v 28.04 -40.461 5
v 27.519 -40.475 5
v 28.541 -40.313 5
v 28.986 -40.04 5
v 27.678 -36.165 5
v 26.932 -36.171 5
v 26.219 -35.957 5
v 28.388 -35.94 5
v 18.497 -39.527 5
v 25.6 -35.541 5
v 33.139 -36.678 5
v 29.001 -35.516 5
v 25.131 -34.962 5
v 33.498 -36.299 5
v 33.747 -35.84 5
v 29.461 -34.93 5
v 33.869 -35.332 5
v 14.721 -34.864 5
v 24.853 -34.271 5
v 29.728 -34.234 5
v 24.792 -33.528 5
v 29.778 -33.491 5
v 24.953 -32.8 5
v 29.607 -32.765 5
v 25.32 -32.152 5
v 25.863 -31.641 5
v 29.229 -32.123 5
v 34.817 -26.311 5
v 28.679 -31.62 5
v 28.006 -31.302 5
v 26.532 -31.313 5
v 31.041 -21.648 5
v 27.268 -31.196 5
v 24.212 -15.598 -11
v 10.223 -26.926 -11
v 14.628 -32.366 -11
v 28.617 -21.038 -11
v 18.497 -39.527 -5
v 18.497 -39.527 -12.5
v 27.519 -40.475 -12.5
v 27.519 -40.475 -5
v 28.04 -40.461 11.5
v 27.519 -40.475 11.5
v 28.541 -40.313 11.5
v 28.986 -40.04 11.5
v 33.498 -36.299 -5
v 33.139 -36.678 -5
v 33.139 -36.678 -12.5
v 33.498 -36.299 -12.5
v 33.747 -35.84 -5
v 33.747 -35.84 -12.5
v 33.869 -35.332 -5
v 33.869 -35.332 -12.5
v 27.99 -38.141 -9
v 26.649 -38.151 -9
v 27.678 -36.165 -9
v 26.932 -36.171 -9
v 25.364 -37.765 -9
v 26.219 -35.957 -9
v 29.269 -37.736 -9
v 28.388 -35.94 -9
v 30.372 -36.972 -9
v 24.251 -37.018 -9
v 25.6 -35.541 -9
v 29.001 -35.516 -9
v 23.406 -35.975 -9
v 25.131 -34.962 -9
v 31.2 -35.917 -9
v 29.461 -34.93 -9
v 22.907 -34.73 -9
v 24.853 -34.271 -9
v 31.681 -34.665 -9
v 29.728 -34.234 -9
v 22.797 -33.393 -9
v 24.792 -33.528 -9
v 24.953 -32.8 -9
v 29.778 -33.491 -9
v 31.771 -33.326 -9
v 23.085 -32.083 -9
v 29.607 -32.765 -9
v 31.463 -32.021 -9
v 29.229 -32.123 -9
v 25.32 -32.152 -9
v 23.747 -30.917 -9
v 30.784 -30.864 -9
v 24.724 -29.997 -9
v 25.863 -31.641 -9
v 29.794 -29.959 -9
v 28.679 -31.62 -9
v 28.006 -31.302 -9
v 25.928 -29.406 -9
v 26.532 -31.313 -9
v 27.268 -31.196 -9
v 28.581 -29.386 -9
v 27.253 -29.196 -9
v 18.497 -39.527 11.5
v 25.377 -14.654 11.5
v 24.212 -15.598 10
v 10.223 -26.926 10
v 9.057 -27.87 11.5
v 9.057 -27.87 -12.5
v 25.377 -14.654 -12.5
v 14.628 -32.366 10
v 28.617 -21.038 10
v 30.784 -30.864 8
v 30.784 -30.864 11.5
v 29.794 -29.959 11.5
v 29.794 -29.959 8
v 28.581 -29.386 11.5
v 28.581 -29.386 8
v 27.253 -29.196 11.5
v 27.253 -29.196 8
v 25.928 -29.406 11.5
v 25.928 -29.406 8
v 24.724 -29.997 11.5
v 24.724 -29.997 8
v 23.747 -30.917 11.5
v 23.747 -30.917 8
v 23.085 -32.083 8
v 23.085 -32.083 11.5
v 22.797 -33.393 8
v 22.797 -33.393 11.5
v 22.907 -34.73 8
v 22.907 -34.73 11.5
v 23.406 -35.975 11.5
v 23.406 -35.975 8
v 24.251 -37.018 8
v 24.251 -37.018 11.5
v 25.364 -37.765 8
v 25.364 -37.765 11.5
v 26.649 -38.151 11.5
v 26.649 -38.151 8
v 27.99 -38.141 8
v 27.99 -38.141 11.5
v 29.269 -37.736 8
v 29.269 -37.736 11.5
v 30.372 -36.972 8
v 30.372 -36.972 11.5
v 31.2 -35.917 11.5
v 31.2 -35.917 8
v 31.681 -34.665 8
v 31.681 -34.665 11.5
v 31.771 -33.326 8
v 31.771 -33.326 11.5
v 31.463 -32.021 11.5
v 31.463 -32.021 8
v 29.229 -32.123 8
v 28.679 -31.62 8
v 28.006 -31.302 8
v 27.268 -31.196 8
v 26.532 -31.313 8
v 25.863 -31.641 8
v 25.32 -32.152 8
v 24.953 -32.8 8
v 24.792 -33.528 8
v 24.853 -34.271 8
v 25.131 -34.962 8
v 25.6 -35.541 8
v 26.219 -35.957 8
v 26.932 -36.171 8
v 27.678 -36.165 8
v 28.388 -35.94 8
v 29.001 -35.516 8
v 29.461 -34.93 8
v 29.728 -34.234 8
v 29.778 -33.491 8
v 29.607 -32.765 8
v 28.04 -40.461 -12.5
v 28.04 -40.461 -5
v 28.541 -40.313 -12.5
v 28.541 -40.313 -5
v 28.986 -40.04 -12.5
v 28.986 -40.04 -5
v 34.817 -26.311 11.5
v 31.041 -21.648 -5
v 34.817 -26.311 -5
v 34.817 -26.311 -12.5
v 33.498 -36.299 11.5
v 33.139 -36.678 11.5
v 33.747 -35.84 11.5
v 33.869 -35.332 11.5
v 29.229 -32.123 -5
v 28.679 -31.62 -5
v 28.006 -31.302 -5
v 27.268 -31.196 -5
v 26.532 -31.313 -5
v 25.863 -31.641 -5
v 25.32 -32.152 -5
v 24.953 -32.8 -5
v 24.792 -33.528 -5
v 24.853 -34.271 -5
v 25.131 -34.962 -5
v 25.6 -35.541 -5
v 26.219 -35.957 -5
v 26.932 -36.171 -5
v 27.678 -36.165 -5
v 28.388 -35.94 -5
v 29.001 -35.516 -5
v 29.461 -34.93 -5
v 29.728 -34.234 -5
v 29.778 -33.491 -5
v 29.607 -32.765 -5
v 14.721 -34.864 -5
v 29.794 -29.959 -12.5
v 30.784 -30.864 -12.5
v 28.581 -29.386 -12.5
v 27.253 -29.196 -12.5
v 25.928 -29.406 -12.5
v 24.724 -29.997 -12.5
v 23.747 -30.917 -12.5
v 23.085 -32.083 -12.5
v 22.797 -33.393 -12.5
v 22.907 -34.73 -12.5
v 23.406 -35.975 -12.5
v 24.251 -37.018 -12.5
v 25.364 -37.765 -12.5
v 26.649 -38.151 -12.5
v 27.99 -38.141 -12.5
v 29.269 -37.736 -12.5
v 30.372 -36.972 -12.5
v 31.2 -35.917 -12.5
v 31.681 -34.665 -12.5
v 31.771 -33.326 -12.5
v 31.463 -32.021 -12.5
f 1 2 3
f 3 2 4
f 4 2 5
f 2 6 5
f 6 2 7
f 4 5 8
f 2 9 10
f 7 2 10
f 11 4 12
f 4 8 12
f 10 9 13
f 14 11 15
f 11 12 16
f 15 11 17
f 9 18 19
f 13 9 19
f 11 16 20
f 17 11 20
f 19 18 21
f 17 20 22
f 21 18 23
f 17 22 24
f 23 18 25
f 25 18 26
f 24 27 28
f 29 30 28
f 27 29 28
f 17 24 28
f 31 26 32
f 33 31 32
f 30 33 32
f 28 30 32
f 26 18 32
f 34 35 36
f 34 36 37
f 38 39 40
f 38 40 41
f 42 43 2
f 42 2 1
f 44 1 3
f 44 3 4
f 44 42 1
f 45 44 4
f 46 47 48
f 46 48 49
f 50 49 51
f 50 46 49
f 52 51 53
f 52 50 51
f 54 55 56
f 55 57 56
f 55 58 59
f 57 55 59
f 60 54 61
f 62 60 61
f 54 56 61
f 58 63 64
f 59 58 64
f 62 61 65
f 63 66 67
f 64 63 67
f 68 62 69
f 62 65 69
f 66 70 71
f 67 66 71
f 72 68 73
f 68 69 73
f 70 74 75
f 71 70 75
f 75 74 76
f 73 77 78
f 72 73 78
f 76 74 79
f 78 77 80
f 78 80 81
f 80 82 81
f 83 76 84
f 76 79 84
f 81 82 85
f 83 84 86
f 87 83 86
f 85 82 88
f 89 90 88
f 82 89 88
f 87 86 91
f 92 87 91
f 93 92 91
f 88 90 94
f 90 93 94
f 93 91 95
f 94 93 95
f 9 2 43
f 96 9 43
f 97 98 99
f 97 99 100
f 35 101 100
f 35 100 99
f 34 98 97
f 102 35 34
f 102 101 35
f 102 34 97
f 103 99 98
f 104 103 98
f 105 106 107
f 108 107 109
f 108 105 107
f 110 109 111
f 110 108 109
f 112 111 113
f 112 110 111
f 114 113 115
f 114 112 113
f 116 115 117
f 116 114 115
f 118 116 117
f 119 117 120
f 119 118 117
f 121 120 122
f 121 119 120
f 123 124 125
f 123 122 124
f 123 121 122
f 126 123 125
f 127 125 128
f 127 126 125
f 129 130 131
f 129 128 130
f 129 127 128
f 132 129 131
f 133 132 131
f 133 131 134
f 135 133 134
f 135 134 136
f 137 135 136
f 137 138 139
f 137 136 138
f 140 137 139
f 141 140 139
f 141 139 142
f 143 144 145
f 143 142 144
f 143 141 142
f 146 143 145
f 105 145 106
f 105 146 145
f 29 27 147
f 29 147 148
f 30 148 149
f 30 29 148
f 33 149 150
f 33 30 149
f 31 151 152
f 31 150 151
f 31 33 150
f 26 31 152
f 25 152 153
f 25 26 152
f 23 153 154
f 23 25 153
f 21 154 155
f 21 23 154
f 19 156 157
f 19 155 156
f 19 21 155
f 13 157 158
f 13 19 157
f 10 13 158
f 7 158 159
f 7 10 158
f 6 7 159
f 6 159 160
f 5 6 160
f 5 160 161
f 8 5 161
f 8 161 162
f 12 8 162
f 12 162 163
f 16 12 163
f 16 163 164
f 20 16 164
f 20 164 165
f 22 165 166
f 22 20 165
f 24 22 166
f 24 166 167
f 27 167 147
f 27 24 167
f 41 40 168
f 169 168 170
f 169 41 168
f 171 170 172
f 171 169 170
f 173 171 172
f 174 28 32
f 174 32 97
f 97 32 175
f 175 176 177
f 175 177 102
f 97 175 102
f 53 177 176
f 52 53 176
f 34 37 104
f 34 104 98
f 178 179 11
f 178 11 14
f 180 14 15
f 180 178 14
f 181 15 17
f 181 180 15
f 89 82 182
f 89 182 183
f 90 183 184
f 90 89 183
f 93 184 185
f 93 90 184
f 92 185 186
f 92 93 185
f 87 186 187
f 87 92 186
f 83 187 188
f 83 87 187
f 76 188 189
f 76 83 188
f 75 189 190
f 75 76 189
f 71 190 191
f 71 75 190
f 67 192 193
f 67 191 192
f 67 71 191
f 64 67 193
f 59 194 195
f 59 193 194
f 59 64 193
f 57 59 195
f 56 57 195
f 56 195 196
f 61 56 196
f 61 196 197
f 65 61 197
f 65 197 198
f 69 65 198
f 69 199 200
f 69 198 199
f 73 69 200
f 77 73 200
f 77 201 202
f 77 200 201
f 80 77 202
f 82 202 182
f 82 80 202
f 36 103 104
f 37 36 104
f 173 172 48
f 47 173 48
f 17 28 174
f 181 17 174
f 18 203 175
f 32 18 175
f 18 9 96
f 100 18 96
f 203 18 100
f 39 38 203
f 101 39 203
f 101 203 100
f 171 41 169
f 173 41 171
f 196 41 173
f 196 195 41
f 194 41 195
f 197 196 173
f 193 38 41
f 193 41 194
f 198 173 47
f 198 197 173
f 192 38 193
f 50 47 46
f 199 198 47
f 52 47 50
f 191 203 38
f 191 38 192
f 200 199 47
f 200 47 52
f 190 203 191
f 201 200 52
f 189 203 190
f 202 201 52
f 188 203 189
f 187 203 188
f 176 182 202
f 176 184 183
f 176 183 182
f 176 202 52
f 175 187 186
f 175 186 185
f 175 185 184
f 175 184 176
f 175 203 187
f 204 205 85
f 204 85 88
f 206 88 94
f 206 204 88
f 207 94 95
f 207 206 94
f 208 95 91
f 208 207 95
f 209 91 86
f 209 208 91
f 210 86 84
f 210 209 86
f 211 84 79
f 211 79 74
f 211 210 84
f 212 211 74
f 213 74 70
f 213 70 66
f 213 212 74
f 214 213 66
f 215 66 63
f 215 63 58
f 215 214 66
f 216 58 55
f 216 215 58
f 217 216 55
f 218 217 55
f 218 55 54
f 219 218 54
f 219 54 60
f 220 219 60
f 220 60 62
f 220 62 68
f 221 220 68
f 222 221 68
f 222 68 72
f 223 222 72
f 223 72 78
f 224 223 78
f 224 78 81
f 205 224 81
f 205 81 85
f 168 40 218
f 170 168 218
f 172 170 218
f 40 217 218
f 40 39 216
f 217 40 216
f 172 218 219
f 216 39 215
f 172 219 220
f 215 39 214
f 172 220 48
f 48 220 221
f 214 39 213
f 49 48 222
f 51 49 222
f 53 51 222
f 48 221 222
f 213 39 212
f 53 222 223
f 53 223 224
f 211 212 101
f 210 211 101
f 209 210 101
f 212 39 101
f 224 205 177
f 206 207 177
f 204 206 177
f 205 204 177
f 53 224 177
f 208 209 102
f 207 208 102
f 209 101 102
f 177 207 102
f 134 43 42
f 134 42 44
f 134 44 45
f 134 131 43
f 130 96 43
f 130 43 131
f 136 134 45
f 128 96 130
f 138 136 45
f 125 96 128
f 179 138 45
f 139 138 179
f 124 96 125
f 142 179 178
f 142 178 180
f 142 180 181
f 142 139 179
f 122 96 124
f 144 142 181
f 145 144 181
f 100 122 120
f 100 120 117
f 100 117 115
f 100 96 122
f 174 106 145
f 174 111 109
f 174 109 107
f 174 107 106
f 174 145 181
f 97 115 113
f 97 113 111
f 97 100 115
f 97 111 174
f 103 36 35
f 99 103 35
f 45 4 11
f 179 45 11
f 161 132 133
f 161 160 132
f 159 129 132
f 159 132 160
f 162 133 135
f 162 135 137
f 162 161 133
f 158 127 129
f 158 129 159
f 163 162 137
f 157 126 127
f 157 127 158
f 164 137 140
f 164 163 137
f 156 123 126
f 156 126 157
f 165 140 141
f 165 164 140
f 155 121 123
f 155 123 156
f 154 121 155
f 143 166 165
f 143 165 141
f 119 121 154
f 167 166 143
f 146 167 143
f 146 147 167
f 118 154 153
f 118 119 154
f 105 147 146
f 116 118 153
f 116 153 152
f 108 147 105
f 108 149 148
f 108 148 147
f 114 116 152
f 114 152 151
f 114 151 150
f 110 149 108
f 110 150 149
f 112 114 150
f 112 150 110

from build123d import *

# Parameters (mm, degrees)
CYLINDER025_R          = 2.5
CYLINDER025_DEPTH      = 32
CYLINDER027_R          = 4.5
CYLINDER027_DEPTH      = 5
CYLINDER026_R          = 4.5
CYLINDER026_DEPTH      = 5
BOX007_W               = 24
BOX007_H               = 14
BOX007_DEPTH           = 10
BOX005_W               = 18
BOX005_H               = 10
BOX005_DEPTH           = 21
BOX006_W               = 21
BOX006_H               = 22
BOX006_DEPTH           = 24
CHAMFER_SIZE           = 7
FILLET_R               = 2
CUT022_PLACEMENT_ANGLE = 39


with BuildPart() as cylinder025:
    # Cylinder025 → Cylinder025 (new body)
    with BuildSketch(Plane(origin=(55, -39, -20), x_dir=(1, 0, 0), z_dir=(0, 0, 1))):
        Circle(CYLINDER025_R)
    extrude(amount=CYLINDER025_DEPTH)


with BuildPart() as cylinder027:
    # Cylinder027 → Cylinder027 (new body)
    with BuildSketch(Plane(origin=(55, -39, 8), x_dir=(1, 0, 0), z_dir=(0, 0, 1))):
        Circle(CYLINDER027_R)
    extrude(amount=CYLINDER027_DEPTH)


with BuildPart() as cylinder026:
    # Cylinder026 → Cylinder026 (new body)
    with BuildSketch(Plane(origin=(55, -39, -14), x_dir=(1, 0, 0), z_dir=(0, 0, 1))):
        Circle(CYLINDER026_R)
    extrude(amount=CYLINDER026_DEPTH)


with BuildPart() as box007:
    # Box007 → Box007 (new body)
    with BuildSketch(Plane(origin=(43, -46, -5), x_dir=(1, 0, 0), z_dir=(0, 0, 1))):
        with Locations((12, 7)):
            Rectangle(BOX007_W, BOX007_H)
    extrude(amount=BOX007_DEPTH)


with BuildPart() as box005:
    # Box005 → Box005 (new body)
    with BuildSketch(Plane(origin=(46, -30, -11), x_dir=(1, 0, 0), z_dir=(0, 0, 1))):
        with Locations((9, 5)):
            Rectangle(BOX005_W, BOX005_H)
    extrude(amount=BOX005_DEPTH)


with BuildPart() as cut022:
    # Box006 → Box006 (new body)
    with BuildSketch(Plane(origin=(44.5, -45, -12.5), x_dir=(1, 0, 0), z_dir=(0, 0, 1))):
        with Locations((10.5, 11)):
            Rectangle(BOX006_W, BOX006_H)
    extrude(amount=BOX006_DEPTH)

    # Cut018: cut Box005
    add(box005.part, mode=Mode.SUBTRACT)

    # Chamfer
    chamfer_edges = [cut022.edges().sort_by_distance(p)[0] for p in [
        (44.5, -45, -0.5),
        (65.5, -45, -0.5),
    ]]
    chamfer(chamfer_edges, length=CHAMFER_SIZE)

    # Fillet
    fillet_edges = [cut022.edges().sort_by_distance(p)[0] for p in [
        (51.5, -45, -0.5),
        (58.5, -45, -0.5),
    ]]
    fillet(fillet_edges, radius=FILLET_R)

    # Cut019: cut Box007
    add(box007.part, mode=Mode.SUBTRACT)

    # Cut020: cut Cylinder026
    add(cylinder026.part, mode=Mode.SUBTRACT)

    # Cut021: cut Cylinder027
    add(cylinder027.part, mode=Mode.SUBTRACT)

    # Cut022: cut Cylinder025
    add(cylinder025.part, mode=Mode.SUBTRACT)


with BuildPart() as cut022_1:
    # Cut022 placement: moved
    add(cut022.part.moved(Location((-40, -38, 0))).rotate(Axis((-40, -38, 0), (0, 0, 1)), CUT022_PLACEMENT_ANGLE))


solid = cut022_1.part
